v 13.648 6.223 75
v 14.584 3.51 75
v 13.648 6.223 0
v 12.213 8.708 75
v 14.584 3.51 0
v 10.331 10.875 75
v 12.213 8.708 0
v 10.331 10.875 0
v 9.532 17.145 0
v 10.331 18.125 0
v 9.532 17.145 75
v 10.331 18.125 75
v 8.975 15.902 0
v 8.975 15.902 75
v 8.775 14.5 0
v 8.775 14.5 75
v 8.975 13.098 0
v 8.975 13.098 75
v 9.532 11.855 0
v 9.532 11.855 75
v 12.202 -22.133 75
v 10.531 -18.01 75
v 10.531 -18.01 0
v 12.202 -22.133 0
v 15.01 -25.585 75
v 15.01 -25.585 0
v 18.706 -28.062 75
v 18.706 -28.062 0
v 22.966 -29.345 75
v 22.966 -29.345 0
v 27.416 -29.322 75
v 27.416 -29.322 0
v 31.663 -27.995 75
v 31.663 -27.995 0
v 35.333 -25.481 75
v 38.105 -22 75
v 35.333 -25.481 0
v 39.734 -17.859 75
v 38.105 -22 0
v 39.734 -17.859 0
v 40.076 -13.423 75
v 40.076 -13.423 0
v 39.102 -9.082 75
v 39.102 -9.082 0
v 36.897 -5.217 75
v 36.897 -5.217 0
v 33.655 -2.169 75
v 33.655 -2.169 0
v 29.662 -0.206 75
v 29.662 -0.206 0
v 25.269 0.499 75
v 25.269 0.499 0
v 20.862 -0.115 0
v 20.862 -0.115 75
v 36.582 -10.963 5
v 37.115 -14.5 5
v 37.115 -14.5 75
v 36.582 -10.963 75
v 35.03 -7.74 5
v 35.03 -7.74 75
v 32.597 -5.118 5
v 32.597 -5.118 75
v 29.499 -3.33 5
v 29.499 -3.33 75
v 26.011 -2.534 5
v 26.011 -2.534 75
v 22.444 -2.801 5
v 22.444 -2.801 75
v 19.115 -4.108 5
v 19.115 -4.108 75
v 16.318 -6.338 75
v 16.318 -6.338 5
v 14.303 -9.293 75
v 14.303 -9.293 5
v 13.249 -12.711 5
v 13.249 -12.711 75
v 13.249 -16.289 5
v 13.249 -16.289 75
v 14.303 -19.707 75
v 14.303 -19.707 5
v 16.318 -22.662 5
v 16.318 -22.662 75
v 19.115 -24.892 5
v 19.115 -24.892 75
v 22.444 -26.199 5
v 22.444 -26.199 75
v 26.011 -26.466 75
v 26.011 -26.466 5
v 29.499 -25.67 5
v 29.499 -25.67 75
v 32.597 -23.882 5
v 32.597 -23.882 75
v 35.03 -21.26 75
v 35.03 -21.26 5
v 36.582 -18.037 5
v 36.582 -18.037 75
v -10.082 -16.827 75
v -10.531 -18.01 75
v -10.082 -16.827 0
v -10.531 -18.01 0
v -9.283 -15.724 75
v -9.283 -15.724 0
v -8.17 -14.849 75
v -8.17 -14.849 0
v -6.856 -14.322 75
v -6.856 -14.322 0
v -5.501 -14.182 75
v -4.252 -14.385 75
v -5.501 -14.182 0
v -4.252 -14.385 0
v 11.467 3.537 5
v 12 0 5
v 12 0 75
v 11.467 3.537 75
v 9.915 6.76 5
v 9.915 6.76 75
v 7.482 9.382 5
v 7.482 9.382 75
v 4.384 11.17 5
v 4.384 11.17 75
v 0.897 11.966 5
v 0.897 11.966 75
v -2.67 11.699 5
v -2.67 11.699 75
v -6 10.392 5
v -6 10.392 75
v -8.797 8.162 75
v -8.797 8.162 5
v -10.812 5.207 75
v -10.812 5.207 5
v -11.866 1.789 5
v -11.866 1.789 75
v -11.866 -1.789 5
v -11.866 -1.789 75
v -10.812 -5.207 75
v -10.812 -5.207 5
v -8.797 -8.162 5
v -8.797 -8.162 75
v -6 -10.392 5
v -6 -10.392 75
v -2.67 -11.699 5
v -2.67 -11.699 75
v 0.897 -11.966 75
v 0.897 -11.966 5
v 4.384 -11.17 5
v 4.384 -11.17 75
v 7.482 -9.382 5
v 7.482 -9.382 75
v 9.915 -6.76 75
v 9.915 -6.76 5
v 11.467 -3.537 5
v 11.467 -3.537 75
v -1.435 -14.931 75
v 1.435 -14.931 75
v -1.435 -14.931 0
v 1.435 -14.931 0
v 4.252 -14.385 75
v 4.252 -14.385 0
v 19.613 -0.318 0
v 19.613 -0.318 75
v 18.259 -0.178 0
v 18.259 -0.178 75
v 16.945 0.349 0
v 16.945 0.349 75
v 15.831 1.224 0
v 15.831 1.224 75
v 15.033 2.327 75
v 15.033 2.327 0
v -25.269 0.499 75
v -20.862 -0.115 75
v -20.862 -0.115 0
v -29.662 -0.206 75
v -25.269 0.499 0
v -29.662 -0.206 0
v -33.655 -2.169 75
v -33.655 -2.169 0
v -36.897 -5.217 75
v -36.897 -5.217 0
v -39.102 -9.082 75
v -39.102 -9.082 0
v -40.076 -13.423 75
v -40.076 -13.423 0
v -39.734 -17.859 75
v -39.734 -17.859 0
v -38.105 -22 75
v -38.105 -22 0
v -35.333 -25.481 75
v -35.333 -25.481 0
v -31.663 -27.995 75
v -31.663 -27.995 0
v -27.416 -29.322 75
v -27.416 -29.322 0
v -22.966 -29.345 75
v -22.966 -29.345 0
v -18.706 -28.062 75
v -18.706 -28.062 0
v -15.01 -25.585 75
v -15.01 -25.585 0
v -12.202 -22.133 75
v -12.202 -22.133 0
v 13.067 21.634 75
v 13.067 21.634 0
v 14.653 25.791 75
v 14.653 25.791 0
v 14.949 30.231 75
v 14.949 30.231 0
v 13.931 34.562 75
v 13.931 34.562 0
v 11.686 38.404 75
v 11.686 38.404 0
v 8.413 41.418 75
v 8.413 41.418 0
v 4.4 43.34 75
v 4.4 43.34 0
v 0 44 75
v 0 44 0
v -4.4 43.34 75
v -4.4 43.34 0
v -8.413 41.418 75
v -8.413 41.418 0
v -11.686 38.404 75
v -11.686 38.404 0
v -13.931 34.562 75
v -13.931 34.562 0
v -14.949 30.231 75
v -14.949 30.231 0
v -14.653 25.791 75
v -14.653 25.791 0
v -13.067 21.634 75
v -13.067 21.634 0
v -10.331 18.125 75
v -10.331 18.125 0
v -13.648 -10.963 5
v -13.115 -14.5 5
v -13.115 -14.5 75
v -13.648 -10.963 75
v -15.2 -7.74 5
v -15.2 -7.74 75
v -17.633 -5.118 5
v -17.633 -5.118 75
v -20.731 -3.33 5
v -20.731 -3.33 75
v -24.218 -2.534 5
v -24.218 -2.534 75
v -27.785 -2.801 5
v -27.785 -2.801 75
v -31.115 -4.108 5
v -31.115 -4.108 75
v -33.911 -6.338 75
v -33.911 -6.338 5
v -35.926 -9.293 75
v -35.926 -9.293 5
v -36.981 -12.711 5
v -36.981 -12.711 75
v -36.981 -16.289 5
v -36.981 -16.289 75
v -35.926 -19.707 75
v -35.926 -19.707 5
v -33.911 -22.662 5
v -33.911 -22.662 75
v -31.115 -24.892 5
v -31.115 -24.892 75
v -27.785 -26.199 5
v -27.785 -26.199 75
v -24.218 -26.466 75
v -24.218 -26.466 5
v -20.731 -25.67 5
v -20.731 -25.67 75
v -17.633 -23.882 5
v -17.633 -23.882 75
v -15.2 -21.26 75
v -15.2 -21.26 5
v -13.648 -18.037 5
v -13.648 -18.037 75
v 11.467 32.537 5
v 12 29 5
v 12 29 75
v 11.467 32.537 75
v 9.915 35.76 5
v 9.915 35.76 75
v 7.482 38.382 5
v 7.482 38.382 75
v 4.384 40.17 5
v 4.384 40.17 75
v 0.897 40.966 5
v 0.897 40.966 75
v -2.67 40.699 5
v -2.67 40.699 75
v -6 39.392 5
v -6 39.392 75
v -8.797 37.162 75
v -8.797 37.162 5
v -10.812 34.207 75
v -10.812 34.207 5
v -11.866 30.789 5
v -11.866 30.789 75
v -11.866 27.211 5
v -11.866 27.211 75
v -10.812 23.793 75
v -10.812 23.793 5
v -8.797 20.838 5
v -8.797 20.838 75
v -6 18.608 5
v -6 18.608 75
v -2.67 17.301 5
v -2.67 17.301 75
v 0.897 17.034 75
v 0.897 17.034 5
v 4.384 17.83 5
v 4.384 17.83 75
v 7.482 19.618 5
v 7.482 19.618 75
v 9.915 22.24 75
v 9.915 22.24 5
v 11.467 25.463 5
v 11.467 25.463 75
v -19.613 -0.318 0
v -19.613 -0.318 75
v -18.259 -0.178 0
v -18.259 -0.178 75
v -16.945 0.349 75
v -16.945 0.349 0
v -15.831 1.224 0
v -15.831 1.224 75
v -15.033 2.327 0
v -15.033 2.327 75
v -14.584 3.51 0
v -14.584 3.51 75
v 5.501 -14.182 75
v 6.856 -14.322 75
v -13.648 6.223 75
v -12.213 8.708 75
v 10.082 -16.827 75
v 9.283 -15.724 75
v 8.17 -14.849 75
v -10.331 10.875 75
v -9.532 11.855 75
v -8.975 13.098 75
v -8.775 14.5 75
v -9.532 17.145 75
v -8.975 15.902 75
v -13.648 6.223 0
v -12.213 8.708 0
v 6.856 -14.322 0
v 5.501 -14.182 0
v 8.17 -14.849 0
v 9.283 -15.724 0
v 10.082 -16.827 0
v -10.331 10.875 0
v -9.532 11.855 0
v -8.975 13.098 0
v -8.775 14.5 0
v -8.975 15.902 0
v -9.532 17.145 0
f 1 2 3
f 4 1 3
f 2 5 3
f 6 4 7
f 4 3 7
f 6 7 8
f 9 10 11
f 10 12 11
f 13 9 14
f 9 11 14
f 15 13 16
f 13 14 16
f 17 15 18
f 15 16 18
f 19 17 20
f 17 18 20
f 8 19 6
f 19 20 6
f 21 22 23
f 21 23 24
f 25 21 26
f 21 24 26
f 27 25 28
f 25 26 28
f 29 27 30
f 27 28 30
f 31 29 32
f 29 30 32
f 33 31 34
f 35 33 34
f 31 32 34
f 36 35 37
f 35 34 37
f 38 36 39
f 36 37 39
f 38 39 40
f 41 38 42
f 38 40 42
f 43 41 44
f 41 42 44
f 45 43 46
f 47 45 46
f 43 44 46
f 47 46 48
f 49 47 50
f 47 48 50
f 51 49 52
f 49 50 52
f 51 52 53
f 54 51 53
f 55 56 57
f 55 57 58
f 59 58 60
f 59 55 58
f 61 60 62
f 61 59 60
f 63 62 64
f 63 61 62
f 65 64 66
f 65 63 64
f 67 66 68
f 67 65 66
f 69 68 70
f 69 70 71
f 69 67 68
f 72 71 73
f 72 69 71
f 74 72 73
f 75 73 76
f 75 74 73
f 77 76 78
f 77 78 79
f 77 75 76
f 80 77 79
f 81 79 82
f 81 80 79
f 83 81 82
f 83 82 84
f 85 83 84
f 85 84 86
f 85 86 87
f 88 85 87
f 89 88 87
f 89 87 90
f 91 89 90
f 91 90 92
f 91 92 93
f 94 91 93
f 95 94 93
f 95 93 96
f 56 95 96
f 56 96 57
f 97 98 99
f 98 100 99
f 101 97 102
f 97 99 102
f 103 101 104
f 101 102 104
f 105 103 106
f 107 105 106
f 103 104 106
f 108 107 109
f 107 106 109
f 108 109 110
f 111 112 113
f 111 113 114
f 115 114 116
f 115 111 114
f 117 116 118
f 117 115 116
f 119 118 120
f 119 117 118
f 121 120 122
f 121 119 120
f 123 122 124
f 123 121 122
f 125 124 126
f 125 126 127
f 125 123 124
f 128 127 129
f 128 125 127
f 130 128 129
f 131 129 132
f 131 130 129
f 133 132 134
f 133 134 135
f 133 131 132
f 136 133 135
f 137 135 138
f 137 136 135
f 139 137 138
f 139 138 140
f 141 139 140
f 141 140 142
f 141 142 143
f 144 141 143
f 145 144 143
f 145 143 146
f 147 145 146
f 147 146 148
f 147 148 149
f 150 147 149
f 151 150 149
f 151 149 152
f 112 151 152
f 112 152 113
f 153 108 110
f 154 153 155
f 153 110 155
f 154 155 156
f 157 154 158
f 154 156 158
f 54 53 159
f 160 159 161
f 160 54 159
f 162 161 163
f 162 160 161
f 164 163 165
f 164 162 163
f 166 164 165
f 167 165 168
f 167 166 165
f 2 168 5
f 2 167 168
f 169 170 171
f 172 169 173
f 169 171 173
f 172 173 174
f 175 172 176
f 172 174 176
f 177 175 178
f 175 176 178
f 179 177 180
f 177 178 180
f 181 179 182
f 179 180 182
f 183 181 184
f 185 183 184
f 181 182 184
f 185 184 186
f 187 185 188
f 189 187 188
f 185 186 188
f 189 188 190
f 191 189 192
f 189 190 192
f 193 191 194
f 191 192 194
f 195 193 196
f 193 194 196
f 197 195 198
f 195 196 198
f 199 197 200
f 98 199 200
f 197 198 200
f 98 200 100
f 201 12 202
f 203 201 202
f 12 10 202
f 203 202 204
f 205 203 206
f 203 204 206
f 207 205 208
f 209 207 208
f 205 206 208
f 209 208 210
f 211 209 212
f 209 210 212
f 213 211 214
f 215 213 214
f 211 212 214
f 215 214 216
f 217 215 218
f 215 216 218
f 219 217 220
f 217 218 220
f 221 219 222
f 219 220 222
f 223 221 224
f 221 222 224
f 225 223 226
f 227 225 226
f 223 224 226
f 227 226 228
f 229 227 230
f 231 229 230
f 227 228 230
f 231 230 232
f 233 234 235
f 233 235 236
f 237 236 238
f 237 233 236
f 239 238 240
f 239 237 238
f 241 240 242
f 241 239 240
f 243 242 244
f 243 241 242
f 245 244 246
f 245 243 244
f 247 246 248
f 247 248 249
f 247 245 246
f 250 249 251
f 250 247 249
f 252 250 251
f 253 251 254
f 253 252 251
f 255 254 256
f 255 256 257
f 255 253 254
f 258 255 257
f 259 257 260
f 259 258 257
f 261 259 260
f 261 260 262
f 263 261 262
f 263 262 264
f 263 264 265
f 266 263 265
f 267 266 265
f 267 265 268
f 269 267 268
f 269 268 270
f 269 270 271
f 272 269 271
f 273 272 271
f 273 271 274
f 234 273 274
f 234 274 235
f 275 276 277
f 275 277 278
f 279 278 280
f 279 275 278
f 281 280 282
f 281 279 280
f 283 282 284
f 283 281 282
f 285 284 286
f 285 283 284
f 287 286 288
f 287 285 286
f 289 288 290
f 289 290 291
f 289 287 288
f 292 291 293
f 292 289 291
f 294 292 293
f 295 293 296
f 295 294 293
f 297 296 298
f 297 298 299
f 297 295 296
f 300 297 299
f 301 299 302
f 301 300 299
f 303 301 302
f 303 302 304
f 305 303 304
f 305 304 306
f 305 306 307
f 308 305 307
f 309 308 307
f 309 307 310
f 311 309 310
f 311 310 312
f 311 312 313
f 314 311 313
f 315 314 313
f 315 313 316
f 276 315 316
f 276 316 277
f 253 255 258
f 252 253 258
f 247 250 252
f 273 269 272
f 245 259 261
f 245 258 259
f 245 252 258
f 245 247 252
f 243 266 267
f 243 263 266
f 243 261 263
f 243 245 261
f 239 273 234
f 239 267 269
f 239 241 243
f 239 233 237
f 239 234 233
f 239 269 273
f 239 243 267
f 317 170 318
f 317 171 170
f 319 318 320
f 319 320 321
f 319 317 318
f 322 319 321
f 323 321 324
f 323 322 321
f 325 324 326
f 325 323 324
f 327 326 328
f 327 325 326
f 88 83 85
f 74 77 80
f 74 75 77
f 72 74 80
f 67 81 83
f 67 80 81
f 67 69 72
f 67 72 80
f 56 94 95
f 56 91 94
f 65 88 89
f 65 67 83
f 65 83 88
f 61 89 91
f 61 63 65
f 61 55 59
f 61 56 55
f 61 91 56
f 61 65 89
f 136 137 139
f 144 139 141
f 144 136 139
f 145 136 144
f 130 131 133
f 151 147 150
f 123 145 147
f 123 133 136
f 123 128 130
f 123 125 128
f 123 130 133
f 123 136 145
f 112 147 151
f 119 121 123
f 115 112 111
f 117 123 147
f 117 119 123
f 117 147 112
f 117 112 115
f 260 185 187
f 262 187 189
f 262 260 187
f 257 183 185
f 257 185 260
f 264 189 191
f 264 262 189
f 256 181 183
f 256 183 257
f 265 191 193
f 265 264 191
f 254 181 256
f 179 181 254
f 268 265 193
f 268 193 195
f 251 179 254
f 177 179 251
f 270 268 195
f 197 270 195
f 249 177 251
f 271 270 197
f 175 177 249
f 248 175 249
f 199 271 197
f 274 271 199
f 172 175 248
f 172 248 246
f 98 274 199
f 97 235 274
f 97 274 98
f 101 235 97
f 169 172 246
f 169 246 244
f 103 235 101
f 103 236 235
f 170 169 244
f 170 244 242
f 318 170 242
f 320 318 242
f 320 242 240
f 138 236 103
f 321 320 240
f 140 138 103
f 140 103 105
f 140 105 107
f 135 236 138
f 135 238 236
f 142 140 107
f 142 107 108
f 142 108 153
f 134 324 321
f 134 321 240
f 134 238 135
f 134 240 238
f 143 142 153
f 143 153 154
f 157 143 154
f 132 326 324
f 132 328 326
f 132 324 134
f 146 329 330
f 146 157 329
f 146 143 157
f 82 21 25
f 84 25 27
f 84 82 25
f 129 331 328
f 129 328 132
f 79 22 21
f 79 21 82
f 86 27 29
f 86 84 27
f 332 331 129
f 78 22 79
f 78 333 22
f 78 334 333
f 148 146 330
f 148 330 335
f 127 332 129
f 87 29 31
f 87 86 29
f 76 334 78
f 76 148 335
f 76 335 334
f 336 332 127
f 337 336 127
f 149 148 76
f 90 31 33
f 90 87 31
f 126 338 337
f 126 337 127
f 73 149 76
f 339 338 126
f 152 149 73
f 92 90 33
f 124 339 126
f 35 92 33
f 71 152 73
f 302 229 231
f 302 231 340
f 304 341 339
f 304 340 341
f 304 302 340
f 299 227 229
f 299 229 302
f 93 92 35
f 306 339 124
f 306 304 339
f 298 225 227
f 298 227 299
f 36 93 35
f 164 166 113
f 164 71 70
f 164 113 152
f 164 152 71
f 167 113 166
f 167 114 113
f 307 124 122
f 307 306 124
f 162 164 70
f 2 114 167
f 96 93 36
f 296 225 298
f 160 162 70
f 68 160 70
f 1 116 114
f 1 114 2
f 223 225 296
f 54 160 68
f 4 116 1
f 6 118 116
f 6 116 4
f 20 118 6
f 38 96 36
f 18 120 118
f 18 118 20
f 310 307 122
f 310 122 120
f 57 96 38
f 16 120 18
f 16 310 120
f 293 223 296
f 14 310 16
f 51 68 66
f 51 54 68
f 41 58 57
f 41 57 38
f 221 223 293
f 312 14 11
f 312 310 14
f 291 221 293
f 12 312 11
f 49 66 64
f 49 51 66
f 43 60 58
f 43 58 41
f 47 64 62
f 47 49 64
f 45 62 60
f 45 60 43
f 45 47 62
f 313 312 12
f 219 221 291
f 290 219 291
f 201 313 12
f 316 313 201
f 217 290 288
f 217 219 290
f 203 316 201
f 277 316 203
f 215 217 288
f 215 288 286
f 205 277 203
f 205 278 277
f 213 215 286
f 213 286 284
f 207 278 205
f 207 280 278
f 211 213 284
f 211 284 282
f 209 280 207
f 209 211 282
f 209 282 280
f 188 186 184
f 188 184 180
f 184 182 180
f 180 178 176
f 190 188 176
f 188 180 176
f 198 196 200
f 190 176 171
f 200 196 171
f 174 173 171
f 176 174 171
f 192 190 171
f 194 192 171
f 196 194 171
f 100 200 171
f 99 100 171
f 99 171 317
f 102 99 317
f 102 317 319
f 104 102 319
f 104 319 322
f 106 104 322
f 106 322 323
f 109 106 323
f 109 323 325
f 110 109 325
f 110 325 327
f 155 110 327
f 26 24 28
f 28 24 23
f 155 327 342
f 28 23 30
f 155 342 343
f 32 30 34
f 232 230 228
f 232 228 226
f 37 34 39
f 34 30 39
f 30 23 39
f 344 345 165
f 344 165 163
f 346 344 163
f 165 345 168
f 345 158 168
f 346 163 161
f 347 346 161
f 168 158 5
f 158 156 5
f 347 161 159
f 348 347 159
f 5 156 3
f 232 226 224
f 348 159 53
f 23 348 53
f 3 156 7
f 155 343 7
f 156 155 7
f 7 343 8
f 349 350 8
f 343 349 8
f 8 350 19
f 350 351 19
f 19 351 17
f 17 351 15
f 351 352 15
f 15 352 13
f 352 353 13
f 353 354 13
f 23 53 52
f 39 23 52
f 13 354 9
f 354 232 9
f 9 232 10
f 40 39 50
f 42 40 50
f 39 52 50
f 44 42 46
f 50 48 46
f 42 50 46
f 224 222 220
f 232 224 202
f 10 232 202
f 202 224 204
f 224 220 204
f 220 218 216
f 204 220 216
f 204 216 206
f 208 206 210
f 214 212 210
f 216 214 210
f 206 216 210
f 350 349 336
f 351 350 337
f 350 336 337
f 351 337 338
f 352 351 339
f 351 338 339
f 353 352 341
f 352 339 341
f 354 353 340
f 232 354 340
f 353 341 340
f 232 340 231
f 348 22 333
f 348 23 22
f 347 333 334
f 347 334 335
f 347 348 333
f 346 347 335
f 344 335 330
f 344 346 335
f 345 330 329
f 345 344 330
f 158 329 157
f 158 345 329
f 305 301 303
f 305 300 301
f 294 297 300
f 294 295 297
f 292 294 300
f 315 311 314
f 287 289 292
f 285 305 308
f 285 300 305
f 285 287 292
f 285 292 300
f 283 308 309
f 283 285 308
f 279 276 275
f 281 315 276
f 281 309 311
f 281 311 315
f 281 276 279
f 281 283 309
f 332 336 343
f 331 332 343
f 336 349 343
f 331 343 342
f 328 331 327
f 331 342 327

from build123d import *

# Parameters (mm, degrees)
F0_R     = 12
F1_DEPTH = 5
F2_DEPTH = 75
F3_R     = 5


with BuildPart() as f1:
    # F0 (on Top) → F1 (new body)
    with BuildSketch(Plane.XY):
        with BuildLine():
            ThreePointArc((10.637082, -10.576034), (38.105118, -22), (14.477655, -3.923966))
            ThreePointArc((14.477655, -3.923966), (12.990381, 7.5), (3.840573, 14.5))
            ThreePointArc((3.840573, 14.5), (0, 44), (-3.840573, 14.5))
            ThreePointArc((-3.840573, 14.5), (-12.990381, 7.5), (-14.477655, -3.923966))
            ThreePointArc((-14.477655, -3.923966), (-38.105118, -22), (-10.637082, -10.576034))
            ThreePointArc((-10.637082, -10.576034), (0, -15), (10.637082, -10.576034))
        make_face()
        with Locations((-25.114737, -14.5)):
            Circle(F0_R, mode=Mode.SUBTRACT)
        Circle(F0_R, mode=Mode.SUBTRACT)
        with Locations((25.114737, -14.5)):
            Circle(F0_R, mode=Mode.SUBTRACT)
        with Locations((0, 29)):
            Circle(F0_R, mode=Mode.SUBTRACT)
        with Locations((25.114737, -14.5)):
            Circle(F0_R)
        Circle(F0_R)
        with Locations((0, 29)):
            Circle(F0_R)
        with Locations((-25.114737, -14.5)):
            Circle(F0_R)
    extrude(amount=F1_DEPTH)

    # F0 (on Top) → F2 (join)
    with BuildSketch(Plane.XY):
        with BuildLine():
            ThreePointArc((10.637082, -10.576034), (38.105118, -22), (14.477655, -3.923966))
            ThreePointArc((14.477655, -3.923966), (12.990381, 7.5), (3.840573, 14.5))
            ThreePointArc((3.840573, 14.5), (0, 44), (-3.840573, 14.5))
            ThreePointArc((-3.840573, 14.5), (-12.990381, 7.5), (-14.477655, -3.923966))
            ThreePointArc((-14.477655, -3.923966), (-38.105118, -22), (-10.637082, -10.576034))
            ThreePointArc((-10.637082, -10.576034), (0, -15), (10.637082, -10.576034))
        make_face()
        with Locations((-25.114737, -14.5)):
            Circle(F0_R, mode=Mode.SUBTRACT)
        Circle(F0_R, mode=Mode.SUBTRACT)
        with Locations((25.114737, -14.5)):
            Circle(F0_R, mode=Mode.SUBTRACT)
        with Locations((0, 29)):
            Circle(F0_R, mode=Mode.SUBTRACT)
    extrude(amount=F2_DEPTH)

    # F3
    f3_edges = [f1.edges().sort_by_distance(p)[0] for p in [
        (3.840573, 14.5, 37.5),
        (14.477655, -3.923966, 37.5),
        (10.637082, -10.576034, 37.5),
        (-10.637082, -10.576034, 37.5),
        (-14.477655, -3.923966, 37.5),
        (-3.840573, 14.5, 37.5),
    ]]
    fillet(f3_edges, radius=F3_R)


solid = f1.part
